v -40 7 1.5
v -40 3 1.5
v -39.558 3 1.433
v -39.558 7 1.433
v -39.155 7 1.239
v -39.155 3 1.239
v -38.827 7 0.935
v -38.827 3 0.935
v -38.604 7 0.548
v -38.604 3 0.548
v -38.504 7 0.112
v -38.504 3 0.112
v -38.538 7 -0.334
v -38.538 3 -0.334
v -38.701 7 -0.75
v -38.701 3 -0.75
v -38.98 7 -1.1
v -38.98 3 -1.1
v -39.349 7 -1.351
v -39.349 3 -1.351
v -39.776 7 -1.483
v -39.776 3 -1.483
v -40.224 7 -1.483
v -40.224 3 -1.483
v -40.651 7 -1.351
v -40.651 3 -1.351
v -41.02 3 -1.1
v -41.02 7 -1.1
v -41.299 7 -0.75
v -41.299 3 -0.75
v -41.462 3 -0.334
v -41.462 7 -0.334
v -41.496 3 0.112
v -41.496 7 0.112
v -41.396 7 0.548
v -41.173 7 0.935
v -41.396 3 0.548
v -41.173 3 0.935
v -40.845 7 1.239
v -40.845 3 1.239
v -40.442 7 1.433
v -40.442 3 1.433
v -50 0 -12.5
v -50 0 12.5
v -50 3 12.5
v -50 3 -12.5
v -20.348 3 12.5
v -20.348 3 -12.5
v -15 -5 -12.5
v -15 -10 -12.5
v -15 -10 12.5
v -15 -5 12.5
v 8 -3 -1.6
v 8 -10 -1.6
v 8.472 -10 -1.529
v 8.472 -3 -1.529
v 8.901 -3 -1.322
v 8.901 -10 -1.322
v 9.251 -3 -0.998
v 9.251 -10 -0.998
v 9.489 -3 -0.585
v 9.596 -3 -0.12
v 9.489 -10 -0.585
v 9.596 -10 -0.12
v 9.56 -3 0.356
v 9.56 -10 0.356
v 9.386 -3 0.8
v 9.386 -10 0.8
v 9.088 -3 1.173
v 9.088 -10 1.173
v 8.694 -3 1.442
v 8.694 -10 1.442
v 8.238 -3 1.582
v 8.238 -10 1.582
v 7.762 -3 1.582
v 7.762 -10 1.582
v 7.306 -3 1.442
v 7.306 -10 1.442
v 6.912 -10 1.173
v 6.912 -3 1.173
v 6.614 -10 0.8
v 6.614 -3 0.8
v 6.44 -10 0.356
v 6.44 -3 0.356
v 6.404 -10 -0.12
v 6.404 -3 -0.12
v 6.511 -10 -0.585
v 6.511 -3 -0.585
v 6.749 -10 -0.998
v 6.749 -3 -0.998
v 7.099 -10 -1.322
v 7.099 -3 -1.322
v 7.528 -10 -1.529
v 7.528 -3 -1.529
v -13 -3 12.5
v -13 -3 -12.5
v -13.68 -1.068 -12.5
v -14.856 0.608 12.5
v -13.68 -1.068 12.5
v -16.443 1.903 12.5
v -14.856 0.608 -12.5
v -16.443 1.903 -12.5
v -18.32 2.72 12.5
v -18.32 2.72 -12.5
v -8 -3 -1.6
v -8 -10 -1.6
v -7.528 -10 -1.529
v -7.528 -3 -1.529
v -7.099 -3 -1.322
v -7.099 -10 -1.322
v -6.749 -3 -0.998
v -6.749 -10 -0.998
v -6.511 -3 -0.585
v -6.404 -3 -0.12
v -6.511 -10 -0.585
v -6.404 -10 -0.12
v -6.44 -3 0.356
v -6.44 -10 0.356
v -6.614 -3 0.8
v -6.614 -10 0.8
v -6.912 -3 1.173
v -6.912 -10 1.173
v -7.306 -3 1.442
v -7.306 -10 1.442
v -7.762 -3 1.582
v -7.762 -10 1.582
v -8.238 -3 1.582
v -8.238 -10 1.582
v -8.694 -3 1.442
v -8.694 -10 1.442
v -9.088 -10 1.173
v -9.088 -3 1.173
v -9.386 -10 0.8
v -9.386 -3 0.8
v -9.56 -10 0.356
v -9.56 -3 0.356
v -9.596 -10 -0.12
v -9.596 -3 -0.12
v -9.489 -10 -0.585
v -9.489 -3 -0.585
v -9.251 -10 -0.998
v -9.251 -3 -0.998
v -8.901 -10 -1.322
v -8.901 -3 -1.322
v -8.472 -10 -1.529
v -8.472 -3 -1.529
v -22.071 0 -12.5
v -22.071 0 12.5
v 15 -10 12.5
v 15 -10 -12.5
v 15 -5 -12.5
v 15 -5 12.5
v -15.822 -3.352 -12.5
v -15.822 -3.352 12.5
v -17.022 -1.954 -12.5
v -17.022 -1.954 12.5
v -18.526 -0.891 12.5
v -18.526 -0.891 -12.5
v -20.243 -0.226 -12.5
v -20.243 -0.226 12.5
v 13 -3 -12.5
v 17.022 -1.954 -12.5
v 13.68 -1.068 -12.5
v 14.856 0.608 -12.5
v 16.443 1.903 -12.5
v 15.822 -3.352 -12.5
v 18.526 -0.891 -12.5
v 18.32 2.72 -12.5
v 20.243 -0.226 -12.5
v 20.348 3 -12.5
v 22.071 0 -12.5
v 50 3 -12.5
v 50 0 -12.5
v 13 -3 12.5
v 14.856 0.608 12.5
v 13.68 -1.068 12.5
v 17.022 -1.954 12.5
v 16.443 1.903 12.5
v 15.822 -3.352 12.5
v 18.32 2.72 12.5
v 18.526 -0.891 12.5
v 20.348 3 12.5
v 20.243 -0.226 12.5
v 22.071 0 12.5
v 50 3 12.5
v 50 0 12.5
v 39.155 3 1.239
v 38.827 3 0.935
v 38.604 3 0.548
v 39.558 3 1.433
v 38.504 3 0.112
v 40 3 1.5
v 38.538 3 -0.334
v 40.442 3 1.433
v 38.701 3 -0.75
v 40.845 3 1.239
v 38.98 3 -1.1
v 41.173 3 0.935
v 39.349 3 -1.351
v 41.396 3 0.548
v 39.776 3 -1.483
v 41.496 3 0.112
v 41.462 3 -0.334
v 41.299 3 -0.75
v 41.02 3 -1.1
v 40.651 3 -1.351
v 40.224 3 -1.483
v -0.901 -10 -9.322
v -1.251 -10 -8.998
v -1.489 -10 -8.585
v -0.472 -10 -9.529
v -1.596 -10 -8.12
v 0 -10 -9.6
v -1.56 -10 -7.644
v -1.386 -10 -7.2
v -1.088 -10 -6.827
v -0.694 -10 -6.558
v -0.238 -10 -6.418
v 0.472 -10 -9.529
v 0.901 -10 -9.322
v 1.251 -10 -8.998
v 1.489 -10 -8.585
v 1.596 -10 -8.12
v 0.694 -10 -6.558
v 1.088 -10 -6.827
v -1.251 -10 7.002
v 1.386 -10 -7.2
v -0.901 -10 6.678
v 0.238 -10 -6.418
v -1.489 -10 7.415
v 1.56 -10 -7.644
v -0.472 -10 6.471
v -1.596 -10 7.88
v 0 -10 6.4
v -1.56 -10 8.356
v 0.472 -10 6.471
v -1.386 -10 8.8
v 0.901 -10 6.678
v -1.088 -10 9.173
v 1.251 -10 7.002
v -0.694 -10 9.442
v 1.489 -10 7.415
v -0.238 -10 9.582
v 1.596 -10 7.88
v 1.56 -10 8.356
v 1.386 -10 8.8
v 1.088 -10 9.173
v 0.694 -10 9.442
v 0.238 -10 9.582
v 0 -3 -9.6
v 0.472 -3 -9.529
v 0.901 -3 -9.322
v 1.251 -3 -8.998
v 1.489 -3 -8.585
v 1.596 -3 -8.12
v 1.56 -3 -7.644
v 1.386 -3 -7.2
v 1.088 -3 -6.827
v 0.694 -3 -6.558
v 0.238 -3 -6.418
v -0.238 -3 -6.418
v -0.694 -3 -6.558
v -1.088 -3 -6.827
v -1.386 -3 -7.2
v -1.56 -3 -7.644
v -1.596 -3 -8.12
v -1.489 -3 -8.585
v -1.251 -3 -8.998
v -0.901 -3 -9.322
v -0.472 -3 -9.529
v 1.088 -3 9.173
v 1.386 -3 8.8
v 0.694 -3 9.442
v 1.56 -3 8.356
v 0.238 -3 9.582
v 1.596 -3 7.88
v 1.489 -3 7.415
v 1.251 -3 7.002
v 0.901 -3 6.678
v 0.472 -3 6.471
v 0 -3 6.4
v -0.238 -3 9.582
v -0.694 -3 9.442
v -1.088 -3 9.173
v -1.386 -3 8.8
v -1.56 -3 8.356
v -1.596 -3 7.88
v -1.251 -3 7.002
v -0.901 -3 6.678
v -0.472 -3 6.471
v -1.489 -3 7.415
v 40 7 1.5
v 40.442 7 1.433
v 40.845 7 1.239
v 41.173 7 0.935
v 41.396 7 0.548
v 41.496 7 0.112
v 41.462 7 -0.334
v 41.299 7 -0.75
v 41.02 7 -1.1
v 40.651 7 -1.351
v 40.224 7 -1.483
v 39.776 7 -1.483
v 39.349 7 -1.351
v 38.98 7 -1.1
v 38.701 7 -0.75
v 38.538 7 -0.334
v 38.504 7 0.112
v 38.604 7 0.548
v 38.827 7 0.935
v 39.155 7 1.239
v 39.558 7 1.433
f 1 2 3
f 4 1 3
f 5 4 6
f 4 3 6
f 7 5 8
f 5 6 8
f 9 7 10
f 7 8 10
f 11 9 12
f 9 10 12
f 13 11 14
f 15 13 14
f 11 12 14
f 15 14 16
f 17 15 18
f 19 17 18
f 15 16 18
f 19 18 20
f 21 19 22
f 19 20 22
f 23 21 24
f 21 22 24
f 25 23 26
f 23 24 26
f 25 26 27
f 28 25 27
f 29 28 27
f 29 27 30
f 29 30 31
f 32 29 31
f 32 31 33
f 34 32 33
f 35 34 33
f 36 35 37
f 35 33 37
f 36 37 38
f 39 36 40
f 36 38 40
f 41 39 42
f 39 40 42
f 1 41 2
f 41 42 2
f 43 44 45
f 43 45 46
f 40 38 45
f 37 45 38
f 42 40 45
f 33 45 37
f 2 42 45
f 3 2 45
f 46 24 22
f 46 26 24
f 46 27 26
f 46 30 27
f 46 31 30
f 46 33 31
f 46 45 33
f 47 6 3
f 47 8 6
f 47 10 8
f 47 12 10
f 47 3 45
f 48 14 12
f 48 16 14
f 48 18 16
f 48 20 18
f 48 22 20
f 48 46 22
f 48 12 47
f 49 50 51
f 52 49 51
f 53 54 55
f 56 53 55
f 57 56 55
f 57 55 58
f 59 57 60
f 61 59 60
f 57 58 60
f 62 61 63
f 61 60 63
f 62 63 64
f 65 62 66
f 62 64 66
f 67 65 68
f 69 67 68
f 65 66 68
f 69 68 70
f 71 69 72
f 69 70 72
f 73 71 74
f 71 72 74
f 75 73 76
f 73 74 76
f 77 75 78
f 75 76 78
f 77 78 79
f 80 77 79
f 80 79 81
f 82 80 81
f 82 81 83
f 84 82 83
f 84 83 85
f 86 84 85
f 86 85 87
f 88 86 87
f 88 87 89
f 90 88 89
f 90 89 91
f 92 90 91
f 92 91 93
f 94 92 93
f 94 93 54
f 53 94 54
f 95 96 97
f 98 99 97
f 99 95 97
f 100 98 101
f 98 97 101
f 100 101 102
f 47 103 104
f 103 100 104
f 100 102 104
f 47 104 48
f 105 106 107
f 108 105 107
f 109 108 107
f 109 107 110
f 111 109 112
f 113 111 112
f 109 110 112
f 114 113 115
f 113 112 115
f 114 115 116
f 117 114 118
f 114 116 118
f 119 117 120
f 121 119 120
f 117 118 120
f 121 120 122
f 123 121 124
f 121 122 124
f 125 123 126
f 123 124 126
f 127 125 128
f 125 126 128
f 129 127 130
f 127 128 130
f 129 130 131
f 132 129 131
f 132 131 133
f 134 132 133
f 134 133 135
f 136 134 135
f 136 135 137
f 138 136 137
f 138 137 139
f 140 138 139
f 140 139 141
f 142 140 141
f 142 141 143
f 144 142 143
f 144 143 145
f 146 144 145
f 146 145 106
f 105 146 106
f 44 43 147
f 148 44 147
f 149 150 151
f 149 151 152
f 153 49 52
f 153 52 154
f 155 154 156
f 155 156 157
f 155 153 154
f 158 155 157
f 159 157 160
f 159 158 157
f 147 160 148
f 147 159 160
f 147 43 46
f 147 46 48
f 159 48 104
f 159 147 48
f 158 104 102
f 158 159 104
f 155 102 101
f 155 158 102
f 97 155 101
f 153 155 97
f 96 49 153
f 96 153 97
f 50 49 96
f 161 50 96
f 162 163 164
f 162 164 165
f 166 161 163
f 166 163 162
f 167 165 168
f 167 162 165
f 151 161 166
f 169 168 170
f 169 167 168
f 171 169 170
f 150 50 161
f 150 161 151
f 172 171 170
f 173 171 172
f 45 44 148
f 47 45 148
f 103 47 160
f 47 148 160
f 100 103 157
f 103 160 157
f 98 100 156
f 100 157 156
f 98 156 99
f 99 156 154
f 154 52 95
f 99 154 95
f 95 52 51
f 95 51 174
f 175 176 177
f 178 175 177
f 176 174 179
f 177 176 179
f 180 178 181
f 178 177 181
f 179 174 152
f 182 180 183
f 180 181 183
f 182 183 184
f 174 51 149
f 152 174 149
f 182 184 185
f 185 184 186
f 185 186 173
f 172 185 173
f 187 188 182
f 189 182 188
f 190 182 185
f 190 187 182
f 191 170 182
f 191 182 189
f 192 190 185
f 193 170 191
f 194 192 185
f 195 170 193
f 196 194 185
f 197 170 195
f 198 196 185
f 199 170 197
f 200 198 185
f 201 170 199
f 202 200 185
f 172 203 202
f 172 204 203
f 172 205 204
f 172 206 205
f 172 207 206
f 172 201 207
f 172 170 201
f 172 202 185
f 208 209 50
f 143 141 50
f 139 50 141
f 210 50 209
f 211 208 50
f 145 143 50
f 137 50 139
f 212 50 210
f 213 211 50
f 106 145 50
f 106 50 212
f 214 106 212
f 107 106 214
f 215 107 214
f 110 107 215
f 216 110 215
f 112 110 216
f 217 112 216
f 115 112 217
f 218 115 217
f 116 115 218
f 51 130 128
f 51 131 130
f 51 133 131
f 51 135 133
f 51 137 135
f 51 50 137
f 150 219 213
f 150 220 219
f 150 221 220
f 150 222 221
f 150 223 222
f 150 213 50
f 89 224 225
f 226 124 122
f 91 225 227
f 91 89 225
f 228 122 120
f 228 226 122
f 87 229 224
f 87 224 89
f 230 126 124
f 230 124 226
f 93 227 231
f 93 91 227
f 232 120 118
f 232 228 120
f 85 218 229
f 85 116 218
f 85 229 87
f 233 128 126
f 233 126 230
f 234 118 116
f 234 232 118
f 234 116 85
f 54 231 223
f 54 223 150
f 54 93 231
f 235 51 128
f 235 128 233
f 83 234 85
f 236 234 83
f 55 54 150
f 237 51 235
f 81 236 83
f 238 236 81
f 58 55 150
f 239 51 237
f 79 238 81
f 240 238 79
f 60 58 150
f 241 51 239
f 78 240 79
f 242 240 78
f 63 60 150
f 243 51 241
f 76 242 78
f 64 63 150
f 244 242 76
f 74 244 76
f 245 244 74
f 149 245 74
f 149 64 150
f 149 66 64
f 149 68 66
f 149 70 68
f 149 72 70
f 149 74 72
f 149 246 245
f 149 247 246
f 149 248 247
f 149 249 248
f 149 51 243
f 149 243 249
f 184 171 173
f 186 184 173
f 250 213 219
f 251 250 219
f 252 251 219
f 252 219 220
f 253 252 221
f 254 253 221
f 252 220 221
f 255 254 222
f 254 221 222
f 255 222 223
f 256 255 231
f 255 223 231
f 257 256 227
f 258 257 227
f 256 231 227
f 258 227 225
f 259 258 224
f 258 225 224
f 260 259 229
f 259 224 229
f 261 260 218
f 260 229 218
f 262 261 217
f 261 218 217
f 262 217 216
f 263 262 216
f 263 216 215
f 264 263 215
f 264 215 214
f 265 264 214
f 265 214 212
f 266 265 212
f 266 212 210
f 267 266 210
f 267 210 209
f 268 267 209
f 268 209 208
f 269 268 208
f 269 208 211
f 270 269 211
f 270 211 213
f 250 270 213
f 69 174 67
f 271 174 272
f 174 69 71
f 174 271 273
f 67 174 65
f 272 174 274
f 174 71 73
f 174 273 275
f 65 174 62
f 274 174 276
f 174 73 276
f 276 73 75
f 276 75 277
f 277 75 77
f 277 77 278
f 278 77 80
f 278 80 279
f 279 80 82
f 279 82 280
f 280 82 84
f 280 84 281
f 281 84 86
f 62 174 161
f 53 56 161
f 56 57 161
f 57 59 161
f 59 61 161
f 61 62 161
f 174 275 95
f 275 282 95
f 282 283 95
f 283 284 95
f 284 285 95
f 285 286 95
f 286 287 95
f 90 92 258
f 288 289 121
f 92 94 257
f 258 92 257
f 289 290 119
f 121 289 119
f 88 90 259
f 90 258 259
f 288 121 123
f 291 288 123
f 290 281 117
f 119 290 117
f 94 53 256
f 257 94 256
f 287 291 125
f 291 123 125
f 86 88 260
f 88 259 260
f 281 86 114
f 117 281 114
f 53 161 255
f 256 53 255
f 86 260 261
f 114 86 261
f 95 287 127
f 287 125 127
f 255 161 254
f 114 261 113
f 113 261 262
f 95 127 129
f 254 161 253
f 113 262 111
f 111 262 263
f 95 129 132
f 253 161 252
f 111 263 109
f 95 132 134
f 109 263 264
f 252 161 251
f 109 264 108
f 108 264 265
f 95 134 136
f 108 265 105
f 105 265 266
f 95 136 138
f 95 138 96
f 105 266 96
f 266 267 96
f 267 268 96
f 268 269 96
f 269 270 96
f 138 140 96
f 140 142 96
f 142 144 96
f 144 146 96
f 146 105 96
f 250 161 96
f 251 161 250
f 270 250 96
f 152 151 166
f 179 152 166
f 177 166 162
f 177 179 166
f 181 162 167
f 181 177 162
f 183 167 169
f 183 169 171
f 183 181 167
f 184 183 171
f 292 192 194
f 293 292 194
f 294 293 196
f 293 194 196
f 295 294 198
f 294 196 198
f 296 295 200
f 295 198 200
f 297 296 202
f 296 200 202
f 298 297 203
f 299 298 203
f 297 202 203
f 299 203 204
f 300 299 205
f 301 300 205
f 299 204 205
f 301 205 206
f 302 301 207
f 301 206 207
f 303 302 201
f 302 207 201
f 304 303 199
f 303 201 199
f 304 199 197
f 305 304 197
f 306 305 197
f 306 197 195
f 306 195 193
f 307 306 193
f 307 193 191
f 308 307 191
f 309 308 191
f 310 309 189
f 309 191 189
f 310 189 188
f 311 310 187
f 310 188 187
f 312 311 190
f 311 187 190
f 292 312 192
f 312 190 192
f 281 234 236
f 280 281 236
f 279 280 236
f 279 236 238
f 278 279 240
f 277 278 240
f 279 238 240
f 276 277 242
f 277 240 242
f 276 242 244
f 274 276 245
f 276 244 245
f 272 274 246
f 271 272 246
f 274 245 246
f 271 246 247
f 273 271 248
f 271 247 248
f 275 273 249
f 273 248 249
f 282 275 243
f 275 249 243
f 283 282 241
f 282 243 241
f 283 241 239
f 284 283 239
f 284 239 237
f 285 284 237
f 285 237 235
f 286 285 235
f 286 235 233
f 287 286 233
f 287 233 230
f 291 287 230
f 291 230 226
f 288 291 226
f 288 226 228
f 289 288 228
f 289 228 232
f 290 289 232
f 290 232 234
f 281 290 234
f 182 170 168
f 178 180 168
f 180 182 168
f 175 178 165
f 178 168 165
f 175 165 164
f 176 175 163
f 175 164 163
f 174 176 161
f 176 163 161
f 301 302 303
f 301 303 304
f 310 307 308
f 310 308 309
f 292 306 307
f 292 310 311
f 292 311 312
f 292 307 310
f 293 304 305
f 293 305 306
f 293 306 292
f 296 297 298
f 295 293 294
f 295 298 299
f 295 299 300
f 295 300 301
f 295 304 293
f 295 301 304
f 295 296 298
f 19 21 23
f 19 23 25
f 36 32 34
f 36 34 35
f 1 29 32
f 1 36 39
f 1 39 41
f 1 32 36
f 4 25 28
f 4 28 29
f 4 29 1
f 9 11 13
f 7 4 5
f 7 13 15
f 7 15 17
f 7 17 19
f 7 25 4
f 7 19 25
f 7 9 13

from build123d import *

# Parameters (mm, degrees)
SKETCH1_W           = 100
SKETCH1_H           = 25
BOSS_EXTRUDE1_DEPTH = 3
SKETCH2_W           = 30
SKETCH2_H           = 25
BOSS_EXTRUDE2_DEPTH = 5
SKETCH5_R           = 1.6
CUT_EXTRUDE2_DEPTH  = 53.156015952
SKETCH6_W           = 26
SKETCH6_H           = 6
CUT_EXTRUDE3_DEPTH  = 57.124860802
FILLET1_R           = 7.5
SKETCH7_R           = 1.5
BOSS_EXTRUDE3_DEPTH = 4
BOSS_EXTRUDE4_START = 5
SKETCH9_W           = 30
SKETCH9_H           = 25
SKETCH9_R           = 1.6
BOSS_EXTRUDE4_DEPTH = 5


with BuildPart() as part:
    # Sketch1 → Boss-Extrude1 (new body)
    with BuildSketch(Plane(origin=(0, 0, 0), x_dir=(1, 0, 0), z_dir=(0, 1, 0))):
        Rectangle(SKETCH1_W, SKETCH1_H)
    extrude(amount=BOSS_EXTRUDE1_DEPTH)

    # Sketch2 → Boss-Extrude2 (add)
    with BuildSketch(Plane.XZ):
        Rectangle(SKETCH2_W, SKETCH2_H)
    extrude(amount=BOSS_EXTRUDE2_DEPTH)

    # Sketch5 → Cut-Extrude2 (cut, through all)
    with BuildSketch(Plane.XZ.offset(5)):
        with Locations(Location((8, 0, 0), (0, 0, 270))):
            Circle(SKETCH5_R)
        with Locations(Location((0, -8, 0), (0, 0, 270))):
            Circle(SKETCH5_R)
        with Locations(Location((-8, 0, 0), (0, 0, 270))):
            Circle(SKETCH5_R)
        with Locations(Location((0, 8, 0), (0, 0, 270))):
            Circle(SKETCH5_R)
    extrude(amount=-CUT_EXTRUDE2_DEPTH, mode=Mode.SUBTRACT)

    # Sketch6 → Cut-Extrude3 (cut, through all)
    with BuildSketch(Plane(origin=(0, 0, -12.5), x_dir=(-1, 0, 0), z_dir=(0, 0, -1))):
        Rectangle(SKETCH6_W, SKETCH6_H)
    extrude(amount=-CUT_EXTRUDE3_DEPTH, mode=Mode.SUBTRACT)

    # Fillet1
    # the kernel refuses this fillet: 7.5 mm, written as the material it adds along each edge
    with BuildSketch(Plane(origin=(-15, 0, -12.5), x_dir=(-1, 0, 0), z_dir=(0, 0, 1))) as fillet1_piece_1:
        with BuildLine():
            CenterArc((7.071067812, 7.5), FILLET1_R, 199.471220634, 70.528779366)
            Line((0, 5), (-0.141421356, 4.95))
            ThreePointArc((-0.141421356, 4.95), (-0.15, 2.5), (-0.15, 0))
            Line((-0.15, 0), (0, -0.15))
            Line((0, -0.15), (7.071067812, -0.15))
            Line((7.071067812, -0.15), (7.071067812, 0))
        make_face()
    extrude(amount=25)
    with BuildSketch(Plane(origin=(15, 0, 12.5), x_dir=(0, -1, 0), z_dir=(0, 0, -1))) as fillet1_piece_2:
        with BuildLine():
            CenterArc((7.5, -7.071067812), FILLET1_R, 109.471220634, 70.528779366)
            Line((0, -7.071067812), (-0.15, -7.071067812))
            Line((-0.15, -7.071067812), (-0.15, 0))
            Line((-0.15, 0), (0, 0.15))
            ThreePointArc((0, 0.15), (2.5, 0.15), (4.95, 0.141421356))
            Line((4.95, 0.141421356), (5, 0))
        make_face()
    extrude(amount=25)
    # the kernel refuses this fillet: 7.5 mm, written as the material it takes off along each edge
    with BuildSketch(Plane(origin=(-13, 3, -30.871173071), x_dir=(-1.5711876244490177e-12, -1.0, 0), z_dir=(0, 0, 1))) as fillet1_2_piece_1:
        with BuildLine():
            CenterArc((7.5, -7.348469228), FILLET1_R, 101.536959033, 78.463040967)
            Line((0, -7.348469228), (-0.15, -7.348469228))
            Line((-0.15, -7.348469228), (-0.15, 0))
            Line((-0.15, 0), (0, 0.15))
            ThreePointArc((0, 0.15), (3, 0.15), (5.97, 0.146969385))
            Line((5.97, 0.146969385), (6, 0))
        make_face()
    extrude(amount=61.742346142, mode=Mode.SUBTRACT)
    with BuildSketch(Plane(origin=(13, 3, -30.871173071), x_dir=(1, 0, 0), z_dir=(0, 0, 1))) as fillet1_2_piece_2:
        with BuildLine():
            CenterArc((7.348469228, -7.5), FILLET1_R, 90, 78.463040967)
            Line((0, -6), (-0.146969385, -5.97))
            ThreePointArc((-0.146969385, -5.97), (-0.15, -3), (-0.15, 0))
            Line((-0.15, 0), (0, 0.15))
            Line((0, 0.15), (7.348469228, 0.15))
            Line((7.348469228, 0.15), (7.348469228, 0))
        make_face()
    extrude(amount=61.742346142, mode=Mode.SUBTRACT)

    # Sketch7 → Boss-Extrude3 (add)
    with BuildSketch(Plane(origin=(0, 3, 0), x_dir=(1, 0, 0), z_dir=(0, 1, 0))):
        with Locations(Location((-40, 0, 0), (0, 0, 270))):
            Circle(SKETCH7_R)
        with Locations(Location((40, 0, 0), (0, 0, 270))):
            Circle(SKETCH7_R)
    extrude(amount=BOSS_EXTRUDE3_DEPTH)

    # Sketch9 → Boss-Extrude4 (add)
    with BuildSketch(Plane.XZ.offset(5).offset(BOSS_EXTRUDE4_START)):
        Rectangle(SKETCH9_W, SKETCH9_H)
        with Locations(Location((0, -8, 0), (0, 0, 270))):
            Circle(SKETCH9_R, mode=Mode.SUBTRACT)
        with Locations(Location((-8, 0, 0), (0, 0, 270))):
            Circle(SKETCH9_R, mode=Mode.SUBTRACT)
        with Locations(Location((8, 0, 0), (0, 0, 270))):
            Circle(SKETCH9_R, mode=Mode.SUBTRACT)
        with Locations(Location((0, 8, 0), (0, 0, 270))):
            Circle(SKETCH9_R, mode=Mode.SUBTRACT)
    extrude(amount=-BOSS_EXTRUDE4_DEPTH)


solid = part.part
